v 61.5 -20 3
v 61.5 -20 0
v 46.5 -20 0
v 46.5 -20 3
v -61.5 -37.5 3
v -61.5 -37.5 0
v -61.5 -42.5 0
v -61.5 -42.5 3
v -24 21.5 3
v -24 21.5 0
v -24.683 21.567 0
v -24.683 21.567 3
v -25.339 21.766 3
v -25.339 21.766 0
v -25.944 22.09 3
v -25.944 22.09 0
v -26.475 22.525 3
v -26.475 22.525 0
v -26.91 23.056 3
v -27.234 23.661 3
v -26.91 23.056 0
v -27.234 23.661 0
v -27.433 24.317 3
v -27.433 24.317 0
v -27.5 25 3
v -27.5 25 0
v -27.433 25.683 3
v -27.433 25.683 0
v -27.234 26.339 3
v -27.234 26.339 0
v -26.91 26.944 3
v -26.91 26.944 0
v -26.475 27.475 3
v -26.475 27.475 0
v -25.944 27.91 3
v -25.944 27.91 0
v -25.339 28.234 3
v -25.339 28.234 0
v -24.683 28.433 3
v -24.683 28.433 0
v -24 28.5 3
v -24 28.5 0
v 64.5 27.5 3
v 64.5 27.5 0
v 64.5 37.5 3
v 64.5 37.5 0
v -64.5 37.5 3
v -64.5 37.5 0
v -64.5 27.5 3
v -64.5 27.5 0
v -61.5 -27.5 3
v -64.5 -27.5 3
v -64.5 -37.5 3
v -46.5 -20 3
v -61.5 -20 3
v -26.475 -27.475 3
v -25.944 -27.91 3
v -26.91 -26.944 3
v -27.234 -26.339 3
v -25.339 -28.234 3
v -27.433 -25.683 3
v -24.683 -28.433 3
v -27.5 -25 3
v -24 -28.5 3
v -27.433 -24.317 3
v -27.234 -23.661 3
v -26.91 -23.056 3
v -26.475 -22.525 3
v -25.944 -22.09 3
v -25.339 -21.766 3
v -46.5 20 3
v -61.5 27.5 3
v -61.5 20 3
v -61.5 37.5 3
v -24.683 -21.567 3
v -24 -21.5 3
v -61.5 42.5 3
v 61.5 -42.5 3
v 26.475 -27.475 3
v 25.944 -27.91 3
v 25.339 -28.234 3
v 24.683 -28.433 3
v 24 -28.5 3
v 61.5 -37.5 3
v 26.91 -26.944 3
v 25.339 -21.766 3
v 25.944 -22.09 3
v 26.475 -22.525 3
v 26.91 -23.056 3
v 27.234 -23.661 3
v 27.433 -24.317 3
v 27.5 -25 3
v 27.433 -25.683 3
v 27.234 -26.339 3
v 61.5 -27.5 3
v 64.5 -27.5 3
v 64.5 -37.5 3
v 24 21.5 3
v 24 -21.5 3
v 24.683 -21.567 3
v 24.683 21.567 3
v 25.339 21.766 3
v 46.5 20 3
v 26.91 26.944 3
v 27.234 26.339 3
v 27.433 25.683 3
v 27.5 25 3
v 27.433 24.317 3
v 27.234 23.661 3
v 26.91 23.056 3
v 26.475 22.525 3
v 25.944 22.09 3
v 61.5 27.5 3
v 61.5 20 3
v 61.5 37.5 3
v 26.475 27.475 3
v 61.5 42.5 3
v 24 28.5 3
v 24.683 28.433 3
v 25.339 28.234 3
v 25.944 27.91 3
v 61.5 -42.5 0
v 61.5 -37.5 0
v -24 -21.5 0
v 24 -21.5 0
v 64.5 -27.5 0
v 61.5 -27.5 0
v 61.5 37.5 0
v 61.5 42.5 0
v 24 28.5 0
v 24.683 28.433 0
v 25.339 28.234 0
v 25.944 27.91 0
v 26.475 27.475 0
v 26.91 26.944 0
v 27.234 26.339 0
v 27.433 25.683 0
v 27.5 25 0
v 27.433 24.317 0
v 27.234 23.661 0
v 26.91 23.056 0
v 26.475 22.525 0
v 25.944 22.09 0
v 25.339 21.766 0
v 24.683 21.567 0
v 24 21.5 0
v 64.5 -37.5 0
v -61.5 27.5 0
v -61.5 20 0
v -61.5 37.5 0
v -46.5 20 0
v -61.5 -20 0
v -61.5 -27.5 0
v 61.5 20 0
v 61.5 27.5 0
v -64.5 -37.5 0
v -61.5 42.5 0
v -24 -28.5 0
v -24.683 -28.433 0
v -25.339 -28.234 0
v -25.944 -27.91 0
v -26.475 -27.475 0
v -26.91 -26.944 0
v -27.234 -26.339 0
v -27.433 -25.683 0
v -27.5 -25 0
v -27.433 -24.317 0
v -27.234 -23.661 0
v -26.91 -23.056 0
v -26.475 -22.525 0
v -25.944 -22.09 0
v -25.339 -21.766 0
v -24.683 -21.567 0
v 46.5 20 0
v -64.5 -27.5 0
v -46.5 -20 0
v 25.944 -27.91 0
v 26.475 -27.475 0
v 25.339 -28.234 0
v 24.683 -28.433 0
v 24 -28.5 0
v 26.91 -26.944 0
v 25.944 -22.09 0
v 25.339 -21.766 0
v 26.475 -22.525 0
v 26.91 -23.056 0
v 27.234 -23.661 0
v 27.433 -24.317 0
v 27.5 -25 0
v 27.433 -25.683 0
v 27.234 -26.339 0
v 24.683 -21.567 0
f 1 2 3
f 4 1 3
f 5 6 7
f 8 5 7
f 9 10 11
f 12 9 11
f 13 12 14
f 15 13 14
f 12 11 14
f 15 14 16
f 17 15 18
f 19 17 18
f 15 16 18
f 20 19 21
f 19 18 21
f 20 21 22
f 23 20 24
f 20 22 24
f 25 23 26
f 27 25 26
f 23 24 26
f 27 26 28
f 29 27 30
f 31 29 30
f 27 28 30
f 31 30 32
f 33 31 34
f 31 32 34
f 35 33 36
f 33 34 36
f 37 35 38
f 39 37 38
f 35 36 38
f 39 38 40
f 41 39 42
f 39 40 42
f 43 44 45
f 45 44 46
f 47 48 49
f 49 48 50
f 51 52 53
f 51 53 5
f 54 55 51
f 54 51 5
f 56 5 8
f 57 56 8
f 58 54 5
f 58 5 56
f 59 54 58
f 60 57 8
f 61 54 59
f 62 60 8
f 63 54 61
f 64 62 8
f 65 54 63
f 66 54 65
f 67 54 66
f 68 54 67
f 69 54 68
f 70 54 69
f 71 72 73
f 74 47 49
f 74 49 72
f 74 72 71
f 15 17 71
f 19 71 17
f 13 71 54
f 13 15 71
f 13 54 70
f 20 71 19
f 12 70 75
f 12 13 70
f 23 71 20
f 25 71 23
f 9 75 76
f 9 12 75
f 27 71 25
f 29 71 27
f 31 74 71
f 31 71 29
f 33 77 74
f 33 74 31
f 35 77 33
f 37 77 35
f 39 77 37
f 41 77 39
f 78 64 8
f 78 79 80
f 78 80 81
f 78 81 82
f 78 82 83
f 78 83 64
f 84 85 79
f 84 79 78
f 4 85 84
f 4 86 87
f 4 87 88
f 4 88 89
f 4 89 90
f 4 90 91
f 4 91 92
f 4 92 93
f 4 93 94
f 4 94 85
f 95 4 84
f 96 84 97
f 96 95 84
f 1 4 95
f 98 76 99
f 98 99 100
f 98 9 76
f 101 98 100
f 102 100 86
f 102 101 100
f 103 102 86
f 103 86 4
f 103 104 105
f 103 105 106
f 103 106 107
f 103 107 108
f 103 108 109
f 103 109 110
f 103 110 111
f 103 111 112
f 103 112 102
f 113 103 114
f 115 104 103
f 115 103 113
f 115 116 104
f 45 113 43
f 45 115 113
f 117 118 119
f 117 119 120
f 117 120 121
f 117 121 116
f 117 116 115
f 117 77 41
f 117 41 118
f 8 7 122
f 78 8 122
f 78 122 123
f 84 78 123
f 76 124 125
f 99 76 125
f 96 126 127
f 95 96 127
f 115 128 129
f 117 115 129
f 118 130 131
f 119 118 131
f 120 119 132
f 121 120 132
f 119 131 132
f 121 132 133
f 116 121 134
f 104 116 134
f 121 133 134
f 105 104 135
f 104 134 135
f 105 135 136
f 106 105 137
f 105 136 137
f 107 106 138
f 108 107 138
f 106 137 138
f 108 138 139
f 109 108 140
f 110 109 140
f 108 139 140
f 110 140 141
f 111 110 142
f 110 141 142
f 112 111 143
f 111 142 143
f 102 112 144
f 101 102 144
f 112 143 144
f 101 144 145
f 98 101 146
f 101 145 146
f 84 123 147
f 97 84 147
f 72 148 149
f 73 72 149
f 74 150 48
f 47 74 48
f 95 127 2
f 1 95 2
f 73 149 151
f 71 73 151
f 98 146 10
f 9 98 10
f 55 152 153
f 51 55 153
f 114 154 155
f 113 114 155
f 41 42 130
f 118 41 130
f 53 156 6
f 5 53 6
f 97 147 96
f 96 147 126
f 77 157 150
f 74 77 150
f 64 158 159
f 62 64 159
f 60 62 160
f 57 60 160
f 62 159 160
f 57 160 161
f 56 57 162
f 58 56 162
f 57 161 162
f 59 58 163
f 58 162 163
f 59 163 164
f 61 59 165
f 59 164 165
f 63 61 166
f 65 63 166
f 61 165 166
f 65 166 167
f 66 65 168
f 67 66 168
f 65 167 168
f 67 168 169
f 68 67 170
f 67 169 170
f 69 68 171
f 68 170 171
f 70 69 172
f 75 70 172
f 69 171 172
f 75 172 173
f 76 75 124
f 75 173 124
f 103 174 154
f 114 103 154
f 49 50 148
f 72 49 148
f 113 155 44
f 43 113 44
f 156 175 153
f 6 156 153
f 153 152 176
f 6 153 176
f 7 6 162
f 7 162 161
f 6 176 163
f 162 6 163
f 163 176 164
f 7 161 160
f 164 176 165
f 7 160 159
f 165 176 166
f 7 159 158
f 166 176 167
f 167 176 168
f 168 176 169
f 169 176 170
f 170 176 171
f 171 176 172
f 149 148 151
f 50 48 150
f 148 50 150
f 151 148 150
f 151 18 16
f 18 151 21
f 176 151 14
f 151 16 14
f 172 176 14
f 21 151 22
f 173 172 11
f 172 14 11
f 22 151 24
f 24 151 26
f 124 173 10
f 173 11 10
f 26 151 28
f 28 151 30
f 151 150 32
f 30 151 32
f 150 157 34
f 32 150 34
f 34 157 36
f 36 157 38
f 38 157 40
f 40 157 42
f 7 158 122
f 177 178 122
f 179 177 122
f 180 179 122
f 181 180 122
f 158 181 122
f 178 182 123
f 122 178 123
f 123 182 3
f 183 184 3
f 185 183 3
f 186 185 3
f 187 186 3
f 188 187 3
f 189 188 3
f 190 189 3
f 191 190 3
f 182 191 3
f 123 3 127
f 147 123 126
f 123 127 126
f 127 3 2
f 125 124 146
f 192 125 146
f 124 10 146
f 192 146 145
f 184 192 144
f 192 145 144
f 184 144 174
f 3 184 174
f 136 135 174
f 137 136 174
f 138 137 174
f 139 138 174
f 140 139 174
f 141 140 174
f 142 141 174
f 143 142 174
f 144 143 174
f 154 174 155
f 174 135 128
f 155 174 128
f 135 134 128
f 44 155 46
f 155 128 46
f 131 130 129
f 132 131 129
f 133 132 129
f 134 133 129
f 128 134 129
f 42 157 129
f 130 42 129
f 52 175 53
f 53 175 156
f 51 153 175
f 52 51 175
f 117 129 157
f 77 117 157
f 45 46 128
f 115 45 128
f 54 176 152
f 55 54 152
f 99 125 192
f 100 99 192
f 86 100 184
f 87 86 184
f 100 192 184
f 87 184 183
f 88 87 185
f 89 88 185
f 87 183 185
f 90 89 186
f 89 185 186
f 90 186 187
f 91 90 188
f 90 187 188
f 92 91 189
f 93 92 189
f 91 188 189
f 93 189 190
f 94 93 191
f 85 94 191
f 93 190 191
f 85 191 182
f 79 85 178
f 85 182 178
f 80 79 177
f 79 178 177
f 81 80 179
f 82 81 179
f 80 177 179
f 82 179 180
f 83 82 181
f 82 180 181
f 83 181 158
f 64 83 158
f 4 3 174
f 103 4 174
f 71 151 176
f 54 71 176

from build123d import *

# Parameters (mm, degrees)
BOSS_EXTRUDE3_DEPTH = 3


with BuildPart() as part:
    # Sketch1 → Boss-Extrude3 (new body)
    with BuildSketch(Plane.XY):
        Polygon((-61.5, 27.5), (-61.5, 20), (-46.5, 20), (-46.5, -20), (-61.5, -20), (-61.5, -27.5), (-64.5, -27.5), (-64.5, -37.5), (-61.5, -37.5), (-61.5, -42.5), (61.5, -42.5), (61.5, -37.5), (64.5, -37.5), (64.5, -27.5), (61.5, -27.5), (61.5, -20), (46.5, -20), (46.5, 20), (61.5, 20), (61.5, 27.5), (64.5, 27.5), (64.5, 37.5), (61.5, 37.5), (61.5, 42.5), (-61.5, 42.5), (-61.5, 37.5), (-64.5, 37.5), (-64.5, 27.5), align=None)
        with BuildLine():
            Line((-24, 28.5), (24, 28.5))
            ThreePointArc((24, 28.5), (27.5, 25), (24, 21.5))
            Line((24, 21.5), (-24, 21.5))
            ThreePointArc((-24, 21.5), (-27.5, 25), (-24, 28.5))
        make_face(mode=Mode.SUBTRACT)
        with BuildLine():
            Line((-24, -21.5), (24, -21.5))
            ThreePointArc((24, -21.5), (27.5, -25), (24, -28.5))
            Line((24, -28.5), (-24, -28.5))
            ThreePointArc((-24, -28.5), (-27.5, -25), (-24, -21.5))
        make_face(mode=Mode.SUBTRACT)
    extrude(amount=BOSS_EXTRUDE3_DEPTH)


solid = part.part
